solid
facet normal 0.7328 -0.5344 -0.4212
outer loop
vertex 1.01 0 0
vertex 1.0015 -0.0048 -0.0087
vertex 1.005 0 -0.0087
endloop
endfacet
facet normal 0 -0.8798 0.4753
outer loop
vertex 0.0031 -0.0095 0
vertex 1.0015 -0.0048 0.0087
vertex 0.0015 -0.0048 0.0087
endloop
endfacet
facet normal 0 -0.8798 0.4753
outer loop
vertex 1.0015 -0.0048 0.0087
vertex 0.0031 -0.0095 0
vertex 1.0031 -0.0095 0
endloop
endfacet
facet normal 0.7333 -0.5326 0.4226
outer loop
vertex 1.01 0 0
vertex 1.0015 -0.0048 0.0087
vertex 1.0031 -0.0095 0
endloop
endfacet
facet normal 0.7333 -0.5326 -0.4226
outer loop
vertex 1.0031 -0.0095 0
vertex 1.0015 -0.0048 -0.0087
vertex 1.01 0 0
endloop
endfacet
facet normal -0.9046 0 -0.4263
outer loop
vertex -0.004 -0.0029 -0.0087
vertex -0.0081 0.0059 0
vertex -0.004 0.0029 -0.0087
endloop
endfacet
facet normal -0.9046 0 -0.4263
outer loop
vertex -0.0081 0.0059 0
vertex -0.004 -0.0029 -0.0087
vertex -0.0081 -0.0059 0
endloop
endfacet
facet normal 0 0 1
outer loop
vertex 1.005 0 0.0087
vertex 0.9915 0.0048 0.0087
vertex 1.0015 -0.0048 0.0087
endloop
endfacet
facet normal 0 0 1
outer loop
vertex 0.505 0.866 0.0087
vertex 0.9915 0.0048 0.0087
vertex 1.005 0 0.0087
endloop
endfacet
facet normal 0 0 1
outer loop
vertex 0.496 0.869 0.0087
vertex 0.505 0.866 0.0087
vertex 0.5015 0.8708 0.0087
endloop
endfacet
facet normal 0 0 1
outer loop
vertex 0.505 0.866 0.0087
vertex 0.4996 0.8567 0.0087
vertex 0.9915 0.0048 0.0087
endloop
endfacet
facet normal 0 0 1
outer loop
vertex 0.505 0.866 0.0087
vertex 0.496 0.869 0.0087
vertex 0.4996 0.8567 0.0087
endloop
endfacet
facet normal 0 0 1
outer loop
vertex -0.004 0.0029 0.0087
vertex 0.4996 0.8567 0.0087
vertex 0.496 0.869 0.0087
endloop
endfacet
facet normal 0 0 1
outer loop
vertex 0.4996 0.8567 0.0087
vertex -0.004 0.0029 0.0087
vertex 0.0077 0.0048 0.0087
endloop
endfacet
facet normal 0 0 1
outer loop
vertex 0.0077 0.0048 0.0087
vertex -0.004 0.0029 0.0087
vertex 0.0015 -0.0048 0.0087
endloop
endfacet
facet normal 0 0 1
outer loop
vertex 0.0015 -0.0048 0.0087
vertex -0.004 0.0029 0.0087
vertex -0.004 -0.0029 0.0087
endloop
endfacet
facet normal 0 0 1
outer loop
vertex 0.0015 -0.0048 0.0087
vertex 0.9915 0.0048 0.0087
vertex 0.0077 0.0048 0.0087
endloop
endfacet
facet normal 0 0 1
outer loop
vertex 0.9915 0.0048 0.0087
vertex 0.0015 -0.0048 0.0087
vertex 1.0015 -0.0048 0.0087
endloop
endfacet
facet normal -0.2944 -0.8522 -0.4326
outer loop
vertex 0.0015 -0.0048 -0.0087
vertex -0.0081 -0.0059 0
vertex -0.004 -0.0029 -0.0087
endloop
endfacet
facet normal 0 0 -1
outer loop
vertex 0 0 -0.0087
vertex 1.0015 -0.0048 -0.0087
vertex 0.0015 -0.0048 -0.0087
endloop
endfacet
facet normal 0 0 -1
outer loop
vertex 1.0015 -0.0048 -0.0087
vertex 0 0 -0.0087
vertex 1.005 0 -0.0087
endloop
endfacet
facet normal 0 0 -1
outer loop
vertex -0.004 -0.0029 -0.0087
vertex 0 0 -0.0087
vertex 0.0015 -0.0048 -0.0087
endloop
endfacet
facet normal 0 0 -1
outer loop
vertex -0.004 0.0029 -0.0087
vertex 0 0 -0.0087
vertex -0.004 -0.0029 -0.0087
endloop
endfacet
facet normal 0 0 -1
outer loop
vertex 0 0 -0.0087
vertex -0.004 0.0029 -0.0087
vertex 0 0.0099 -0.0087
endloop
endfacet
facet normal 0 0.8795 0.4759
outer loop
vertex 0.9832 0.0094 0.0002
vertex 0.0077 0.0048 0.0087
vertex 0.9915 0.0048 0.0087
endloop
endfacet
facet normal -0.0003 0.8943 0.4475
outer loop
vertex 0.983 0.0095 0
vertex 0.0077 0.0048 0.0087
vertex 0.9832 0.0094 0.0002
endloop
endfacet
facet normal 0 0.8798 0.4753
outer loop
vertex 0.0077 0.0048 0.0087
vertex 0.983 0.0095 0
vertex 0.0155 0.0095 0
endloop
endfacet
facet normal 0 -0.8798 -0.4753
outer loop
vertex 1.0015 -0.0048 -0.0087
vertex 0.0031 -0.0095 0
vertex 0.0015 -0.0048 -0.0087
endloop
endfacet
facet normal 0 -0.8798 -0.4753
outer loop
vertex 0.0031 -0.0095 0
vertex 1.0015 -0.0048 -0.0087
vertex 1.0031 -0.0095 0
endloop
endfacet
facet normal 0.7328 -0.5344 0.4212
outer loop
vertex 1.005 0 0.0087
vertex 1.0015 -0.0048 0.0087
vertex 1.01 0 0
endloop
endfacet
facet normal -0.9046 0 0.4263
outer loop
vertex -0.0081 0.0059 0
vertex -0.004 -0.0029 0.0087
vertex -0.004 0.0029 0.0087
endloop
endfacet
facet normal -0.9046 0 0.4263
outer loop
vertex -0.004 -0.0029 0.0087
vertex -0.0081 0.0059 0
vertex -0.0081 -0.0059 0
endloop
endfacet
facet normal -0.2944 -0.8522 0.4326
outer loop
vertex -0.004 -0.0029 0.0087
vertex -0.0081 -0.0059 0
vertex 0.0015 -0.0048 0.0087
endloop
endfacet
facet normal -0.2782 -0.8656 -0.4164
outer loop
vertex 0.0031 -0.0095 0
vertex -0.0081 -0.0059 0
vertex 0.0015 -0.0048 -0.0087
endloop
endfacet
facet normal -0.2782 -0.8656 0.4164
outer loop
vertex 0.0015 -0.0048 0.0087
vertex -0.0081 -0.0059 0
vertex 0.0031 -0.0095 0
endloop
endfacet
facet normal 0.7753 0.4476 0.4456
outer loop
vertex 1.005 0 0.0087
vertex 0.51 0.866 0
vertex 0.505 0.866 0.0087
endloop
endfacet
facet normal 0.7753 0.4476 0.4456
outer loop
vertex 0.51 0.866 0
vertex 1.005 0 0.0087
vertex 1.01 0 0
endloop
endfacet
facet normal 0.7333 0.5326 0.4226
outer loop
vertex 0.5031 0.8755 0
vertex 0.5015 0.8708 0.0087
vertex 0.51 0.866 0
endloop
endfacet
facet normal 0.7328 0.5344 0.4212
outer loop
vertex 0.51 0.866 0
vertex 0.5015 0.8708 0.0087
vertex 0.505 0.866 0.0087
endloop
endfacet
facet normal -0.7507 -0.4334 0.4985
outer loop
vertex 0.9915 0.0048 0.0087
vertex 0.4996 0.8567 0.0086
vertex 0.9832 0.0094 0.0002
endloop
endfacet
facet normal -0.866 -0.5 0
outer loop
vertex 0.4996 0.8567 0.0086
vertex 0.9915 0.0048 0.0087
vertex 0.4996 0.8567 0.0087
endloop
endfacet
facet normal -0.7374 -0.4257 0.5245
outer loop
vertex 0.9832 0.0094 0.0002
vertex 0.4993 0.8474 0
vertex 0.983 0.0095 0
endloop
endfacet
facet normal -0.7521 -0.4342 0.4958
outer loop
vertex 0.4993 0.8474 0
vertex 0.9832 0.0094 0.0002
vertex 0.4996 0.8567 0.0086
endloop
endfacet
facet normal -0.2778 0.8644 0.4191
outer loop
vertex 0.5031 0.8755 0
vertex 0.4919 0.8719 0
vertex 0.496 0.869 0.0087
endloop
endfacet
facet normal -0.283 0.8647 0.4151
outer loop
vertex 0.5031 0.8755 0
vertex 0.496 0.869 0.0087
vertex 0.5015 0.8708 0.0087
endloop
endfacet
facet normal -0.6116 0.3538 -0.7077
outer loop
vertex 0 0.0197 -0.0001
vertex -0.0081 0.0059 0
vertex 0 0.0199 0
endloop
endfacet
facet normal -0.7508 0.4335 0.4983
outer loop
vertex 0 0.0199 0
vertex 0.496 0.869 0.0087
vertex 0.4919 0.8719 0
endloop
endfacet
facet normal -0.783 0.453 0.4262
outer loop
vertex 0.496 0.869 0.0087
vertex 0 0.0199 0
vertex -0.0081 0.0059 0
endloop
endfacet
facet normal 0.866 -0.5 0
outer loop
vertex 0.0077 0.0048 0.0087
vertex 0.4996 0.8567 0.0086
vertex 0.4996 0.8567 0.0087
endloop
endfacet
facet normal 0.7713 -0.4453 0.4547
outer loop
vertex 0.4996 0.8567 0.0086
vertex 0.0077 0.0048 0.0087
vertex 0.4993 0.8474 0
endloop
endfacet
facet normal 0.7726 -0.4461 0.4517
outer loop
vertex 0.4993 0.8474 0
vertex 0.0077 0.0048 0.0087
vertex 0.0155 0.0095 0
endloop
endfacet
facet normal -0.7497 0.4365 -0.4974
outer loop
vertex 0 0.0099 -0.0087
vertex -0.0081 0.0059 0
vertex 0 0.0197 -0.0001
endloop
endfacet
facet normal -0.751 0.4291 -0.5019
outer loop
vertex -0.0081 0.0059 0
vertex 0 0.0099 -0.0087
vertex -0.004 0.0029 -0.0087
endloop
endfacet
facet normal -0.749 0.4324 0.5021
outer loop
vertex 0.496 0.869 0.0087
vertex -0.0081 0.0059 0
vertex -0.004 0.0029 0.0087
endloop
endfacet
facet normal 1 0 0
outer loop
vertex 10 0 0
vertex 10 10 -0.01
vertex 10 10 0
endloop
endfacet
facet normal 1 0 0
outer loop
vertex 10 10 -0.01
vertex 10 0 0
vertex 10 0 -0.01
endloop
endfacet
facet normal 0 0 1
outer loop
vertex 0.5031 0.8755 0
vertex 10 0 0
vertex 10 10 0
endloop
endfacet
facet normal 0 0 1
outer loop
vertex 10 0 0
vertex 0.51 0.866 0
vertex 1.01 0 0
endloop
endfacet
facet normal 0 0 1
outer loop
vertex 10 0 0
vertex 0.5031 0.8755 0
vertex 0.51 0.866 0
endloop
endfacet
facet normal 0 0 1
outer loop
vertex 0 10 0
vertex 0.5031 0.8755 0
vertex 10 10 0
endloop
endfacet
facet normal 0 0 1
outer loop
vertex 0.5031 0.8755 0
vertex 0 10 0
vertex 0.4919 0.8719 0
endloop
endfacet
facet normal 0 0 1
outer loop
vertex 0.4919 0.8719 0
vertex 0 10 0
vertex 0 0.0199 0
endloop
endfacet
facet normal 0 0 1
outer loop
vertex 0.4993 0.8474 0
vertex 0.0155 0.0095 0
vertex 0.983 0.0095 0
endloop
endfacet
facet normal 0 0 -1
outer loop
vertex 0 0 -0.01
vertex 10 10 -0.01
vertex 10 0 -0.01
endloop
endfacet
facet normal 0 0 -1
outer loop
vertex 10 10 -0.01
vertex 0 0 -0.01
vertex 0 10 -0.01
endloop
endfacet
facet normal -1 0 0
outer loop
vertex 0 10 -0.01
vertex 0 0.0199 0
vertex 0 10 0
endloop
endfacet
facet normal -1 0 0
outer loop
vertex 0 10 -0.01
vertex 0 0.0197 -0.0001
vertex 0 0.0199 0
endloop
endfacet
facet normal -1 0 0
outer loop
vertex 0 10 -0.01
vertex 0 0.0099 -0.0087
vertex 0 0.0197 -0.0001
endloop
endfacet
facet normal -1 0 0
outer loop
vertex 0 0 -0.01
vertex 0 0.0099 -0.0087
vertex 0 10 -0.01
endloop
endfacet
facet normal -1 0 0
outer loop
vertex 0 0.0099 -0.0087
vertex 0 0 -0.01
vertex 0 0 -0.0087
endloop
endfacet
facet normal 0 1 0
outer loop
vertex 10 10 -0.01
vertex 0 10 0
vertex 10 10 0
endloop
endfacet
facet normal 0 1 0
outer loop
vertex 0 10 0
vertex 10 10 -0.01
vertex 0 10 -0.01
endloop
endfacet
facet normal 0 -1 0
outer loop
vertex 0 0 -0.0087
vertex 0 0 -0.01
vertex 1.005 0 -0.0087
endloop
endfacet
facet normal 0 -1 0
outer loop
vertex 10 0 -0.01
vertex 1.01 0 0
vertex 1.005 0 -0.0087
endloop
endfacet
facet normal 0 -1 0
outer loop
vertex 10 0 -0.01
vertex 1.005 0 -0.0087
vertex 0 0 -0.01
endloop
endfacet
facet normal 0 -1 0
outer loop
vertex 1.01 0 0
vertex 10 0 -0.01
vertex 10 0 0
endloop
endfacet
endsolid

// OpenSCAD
hull(){
    translate([0.0, 0.0]) sphere(0.01);
    translate([1.0, 0.0]) sphere(0.01);
}
hull(){
    translate([1.0, 0.0]) sphere(0.01);
    translate([0.5, 0.8660254038]) sphere(0.01);
}
hull(){
    translate([0.5, 0.8660254038]) sphere(0.01);
    translate([0.0, 0.0]) sphere(0.01);
}
hull(){
    translate([0.0, 0.0]) sphere(0.01);
    translate([0.0, 0.0]) sphere(0.01);
}
hull(){
    translate([0.0, 0.0]) sphere(0.01);
    translate([0.0, 0.0]) sphere(0.01);
}
hull(){
    translate([0.0, 0.0]) sphere(0.01);
    translate([0.0, 0.0]) sphere(0.01);
}
hull(){
    translate([0.0, 0.0]) sphere(0.01);
    translate([0.0, 0.0]) sphere(0.01);
}
translate([0,0,-0.01]) color([0.1,0.1,0.1]) cube([10,10,0.01]);
